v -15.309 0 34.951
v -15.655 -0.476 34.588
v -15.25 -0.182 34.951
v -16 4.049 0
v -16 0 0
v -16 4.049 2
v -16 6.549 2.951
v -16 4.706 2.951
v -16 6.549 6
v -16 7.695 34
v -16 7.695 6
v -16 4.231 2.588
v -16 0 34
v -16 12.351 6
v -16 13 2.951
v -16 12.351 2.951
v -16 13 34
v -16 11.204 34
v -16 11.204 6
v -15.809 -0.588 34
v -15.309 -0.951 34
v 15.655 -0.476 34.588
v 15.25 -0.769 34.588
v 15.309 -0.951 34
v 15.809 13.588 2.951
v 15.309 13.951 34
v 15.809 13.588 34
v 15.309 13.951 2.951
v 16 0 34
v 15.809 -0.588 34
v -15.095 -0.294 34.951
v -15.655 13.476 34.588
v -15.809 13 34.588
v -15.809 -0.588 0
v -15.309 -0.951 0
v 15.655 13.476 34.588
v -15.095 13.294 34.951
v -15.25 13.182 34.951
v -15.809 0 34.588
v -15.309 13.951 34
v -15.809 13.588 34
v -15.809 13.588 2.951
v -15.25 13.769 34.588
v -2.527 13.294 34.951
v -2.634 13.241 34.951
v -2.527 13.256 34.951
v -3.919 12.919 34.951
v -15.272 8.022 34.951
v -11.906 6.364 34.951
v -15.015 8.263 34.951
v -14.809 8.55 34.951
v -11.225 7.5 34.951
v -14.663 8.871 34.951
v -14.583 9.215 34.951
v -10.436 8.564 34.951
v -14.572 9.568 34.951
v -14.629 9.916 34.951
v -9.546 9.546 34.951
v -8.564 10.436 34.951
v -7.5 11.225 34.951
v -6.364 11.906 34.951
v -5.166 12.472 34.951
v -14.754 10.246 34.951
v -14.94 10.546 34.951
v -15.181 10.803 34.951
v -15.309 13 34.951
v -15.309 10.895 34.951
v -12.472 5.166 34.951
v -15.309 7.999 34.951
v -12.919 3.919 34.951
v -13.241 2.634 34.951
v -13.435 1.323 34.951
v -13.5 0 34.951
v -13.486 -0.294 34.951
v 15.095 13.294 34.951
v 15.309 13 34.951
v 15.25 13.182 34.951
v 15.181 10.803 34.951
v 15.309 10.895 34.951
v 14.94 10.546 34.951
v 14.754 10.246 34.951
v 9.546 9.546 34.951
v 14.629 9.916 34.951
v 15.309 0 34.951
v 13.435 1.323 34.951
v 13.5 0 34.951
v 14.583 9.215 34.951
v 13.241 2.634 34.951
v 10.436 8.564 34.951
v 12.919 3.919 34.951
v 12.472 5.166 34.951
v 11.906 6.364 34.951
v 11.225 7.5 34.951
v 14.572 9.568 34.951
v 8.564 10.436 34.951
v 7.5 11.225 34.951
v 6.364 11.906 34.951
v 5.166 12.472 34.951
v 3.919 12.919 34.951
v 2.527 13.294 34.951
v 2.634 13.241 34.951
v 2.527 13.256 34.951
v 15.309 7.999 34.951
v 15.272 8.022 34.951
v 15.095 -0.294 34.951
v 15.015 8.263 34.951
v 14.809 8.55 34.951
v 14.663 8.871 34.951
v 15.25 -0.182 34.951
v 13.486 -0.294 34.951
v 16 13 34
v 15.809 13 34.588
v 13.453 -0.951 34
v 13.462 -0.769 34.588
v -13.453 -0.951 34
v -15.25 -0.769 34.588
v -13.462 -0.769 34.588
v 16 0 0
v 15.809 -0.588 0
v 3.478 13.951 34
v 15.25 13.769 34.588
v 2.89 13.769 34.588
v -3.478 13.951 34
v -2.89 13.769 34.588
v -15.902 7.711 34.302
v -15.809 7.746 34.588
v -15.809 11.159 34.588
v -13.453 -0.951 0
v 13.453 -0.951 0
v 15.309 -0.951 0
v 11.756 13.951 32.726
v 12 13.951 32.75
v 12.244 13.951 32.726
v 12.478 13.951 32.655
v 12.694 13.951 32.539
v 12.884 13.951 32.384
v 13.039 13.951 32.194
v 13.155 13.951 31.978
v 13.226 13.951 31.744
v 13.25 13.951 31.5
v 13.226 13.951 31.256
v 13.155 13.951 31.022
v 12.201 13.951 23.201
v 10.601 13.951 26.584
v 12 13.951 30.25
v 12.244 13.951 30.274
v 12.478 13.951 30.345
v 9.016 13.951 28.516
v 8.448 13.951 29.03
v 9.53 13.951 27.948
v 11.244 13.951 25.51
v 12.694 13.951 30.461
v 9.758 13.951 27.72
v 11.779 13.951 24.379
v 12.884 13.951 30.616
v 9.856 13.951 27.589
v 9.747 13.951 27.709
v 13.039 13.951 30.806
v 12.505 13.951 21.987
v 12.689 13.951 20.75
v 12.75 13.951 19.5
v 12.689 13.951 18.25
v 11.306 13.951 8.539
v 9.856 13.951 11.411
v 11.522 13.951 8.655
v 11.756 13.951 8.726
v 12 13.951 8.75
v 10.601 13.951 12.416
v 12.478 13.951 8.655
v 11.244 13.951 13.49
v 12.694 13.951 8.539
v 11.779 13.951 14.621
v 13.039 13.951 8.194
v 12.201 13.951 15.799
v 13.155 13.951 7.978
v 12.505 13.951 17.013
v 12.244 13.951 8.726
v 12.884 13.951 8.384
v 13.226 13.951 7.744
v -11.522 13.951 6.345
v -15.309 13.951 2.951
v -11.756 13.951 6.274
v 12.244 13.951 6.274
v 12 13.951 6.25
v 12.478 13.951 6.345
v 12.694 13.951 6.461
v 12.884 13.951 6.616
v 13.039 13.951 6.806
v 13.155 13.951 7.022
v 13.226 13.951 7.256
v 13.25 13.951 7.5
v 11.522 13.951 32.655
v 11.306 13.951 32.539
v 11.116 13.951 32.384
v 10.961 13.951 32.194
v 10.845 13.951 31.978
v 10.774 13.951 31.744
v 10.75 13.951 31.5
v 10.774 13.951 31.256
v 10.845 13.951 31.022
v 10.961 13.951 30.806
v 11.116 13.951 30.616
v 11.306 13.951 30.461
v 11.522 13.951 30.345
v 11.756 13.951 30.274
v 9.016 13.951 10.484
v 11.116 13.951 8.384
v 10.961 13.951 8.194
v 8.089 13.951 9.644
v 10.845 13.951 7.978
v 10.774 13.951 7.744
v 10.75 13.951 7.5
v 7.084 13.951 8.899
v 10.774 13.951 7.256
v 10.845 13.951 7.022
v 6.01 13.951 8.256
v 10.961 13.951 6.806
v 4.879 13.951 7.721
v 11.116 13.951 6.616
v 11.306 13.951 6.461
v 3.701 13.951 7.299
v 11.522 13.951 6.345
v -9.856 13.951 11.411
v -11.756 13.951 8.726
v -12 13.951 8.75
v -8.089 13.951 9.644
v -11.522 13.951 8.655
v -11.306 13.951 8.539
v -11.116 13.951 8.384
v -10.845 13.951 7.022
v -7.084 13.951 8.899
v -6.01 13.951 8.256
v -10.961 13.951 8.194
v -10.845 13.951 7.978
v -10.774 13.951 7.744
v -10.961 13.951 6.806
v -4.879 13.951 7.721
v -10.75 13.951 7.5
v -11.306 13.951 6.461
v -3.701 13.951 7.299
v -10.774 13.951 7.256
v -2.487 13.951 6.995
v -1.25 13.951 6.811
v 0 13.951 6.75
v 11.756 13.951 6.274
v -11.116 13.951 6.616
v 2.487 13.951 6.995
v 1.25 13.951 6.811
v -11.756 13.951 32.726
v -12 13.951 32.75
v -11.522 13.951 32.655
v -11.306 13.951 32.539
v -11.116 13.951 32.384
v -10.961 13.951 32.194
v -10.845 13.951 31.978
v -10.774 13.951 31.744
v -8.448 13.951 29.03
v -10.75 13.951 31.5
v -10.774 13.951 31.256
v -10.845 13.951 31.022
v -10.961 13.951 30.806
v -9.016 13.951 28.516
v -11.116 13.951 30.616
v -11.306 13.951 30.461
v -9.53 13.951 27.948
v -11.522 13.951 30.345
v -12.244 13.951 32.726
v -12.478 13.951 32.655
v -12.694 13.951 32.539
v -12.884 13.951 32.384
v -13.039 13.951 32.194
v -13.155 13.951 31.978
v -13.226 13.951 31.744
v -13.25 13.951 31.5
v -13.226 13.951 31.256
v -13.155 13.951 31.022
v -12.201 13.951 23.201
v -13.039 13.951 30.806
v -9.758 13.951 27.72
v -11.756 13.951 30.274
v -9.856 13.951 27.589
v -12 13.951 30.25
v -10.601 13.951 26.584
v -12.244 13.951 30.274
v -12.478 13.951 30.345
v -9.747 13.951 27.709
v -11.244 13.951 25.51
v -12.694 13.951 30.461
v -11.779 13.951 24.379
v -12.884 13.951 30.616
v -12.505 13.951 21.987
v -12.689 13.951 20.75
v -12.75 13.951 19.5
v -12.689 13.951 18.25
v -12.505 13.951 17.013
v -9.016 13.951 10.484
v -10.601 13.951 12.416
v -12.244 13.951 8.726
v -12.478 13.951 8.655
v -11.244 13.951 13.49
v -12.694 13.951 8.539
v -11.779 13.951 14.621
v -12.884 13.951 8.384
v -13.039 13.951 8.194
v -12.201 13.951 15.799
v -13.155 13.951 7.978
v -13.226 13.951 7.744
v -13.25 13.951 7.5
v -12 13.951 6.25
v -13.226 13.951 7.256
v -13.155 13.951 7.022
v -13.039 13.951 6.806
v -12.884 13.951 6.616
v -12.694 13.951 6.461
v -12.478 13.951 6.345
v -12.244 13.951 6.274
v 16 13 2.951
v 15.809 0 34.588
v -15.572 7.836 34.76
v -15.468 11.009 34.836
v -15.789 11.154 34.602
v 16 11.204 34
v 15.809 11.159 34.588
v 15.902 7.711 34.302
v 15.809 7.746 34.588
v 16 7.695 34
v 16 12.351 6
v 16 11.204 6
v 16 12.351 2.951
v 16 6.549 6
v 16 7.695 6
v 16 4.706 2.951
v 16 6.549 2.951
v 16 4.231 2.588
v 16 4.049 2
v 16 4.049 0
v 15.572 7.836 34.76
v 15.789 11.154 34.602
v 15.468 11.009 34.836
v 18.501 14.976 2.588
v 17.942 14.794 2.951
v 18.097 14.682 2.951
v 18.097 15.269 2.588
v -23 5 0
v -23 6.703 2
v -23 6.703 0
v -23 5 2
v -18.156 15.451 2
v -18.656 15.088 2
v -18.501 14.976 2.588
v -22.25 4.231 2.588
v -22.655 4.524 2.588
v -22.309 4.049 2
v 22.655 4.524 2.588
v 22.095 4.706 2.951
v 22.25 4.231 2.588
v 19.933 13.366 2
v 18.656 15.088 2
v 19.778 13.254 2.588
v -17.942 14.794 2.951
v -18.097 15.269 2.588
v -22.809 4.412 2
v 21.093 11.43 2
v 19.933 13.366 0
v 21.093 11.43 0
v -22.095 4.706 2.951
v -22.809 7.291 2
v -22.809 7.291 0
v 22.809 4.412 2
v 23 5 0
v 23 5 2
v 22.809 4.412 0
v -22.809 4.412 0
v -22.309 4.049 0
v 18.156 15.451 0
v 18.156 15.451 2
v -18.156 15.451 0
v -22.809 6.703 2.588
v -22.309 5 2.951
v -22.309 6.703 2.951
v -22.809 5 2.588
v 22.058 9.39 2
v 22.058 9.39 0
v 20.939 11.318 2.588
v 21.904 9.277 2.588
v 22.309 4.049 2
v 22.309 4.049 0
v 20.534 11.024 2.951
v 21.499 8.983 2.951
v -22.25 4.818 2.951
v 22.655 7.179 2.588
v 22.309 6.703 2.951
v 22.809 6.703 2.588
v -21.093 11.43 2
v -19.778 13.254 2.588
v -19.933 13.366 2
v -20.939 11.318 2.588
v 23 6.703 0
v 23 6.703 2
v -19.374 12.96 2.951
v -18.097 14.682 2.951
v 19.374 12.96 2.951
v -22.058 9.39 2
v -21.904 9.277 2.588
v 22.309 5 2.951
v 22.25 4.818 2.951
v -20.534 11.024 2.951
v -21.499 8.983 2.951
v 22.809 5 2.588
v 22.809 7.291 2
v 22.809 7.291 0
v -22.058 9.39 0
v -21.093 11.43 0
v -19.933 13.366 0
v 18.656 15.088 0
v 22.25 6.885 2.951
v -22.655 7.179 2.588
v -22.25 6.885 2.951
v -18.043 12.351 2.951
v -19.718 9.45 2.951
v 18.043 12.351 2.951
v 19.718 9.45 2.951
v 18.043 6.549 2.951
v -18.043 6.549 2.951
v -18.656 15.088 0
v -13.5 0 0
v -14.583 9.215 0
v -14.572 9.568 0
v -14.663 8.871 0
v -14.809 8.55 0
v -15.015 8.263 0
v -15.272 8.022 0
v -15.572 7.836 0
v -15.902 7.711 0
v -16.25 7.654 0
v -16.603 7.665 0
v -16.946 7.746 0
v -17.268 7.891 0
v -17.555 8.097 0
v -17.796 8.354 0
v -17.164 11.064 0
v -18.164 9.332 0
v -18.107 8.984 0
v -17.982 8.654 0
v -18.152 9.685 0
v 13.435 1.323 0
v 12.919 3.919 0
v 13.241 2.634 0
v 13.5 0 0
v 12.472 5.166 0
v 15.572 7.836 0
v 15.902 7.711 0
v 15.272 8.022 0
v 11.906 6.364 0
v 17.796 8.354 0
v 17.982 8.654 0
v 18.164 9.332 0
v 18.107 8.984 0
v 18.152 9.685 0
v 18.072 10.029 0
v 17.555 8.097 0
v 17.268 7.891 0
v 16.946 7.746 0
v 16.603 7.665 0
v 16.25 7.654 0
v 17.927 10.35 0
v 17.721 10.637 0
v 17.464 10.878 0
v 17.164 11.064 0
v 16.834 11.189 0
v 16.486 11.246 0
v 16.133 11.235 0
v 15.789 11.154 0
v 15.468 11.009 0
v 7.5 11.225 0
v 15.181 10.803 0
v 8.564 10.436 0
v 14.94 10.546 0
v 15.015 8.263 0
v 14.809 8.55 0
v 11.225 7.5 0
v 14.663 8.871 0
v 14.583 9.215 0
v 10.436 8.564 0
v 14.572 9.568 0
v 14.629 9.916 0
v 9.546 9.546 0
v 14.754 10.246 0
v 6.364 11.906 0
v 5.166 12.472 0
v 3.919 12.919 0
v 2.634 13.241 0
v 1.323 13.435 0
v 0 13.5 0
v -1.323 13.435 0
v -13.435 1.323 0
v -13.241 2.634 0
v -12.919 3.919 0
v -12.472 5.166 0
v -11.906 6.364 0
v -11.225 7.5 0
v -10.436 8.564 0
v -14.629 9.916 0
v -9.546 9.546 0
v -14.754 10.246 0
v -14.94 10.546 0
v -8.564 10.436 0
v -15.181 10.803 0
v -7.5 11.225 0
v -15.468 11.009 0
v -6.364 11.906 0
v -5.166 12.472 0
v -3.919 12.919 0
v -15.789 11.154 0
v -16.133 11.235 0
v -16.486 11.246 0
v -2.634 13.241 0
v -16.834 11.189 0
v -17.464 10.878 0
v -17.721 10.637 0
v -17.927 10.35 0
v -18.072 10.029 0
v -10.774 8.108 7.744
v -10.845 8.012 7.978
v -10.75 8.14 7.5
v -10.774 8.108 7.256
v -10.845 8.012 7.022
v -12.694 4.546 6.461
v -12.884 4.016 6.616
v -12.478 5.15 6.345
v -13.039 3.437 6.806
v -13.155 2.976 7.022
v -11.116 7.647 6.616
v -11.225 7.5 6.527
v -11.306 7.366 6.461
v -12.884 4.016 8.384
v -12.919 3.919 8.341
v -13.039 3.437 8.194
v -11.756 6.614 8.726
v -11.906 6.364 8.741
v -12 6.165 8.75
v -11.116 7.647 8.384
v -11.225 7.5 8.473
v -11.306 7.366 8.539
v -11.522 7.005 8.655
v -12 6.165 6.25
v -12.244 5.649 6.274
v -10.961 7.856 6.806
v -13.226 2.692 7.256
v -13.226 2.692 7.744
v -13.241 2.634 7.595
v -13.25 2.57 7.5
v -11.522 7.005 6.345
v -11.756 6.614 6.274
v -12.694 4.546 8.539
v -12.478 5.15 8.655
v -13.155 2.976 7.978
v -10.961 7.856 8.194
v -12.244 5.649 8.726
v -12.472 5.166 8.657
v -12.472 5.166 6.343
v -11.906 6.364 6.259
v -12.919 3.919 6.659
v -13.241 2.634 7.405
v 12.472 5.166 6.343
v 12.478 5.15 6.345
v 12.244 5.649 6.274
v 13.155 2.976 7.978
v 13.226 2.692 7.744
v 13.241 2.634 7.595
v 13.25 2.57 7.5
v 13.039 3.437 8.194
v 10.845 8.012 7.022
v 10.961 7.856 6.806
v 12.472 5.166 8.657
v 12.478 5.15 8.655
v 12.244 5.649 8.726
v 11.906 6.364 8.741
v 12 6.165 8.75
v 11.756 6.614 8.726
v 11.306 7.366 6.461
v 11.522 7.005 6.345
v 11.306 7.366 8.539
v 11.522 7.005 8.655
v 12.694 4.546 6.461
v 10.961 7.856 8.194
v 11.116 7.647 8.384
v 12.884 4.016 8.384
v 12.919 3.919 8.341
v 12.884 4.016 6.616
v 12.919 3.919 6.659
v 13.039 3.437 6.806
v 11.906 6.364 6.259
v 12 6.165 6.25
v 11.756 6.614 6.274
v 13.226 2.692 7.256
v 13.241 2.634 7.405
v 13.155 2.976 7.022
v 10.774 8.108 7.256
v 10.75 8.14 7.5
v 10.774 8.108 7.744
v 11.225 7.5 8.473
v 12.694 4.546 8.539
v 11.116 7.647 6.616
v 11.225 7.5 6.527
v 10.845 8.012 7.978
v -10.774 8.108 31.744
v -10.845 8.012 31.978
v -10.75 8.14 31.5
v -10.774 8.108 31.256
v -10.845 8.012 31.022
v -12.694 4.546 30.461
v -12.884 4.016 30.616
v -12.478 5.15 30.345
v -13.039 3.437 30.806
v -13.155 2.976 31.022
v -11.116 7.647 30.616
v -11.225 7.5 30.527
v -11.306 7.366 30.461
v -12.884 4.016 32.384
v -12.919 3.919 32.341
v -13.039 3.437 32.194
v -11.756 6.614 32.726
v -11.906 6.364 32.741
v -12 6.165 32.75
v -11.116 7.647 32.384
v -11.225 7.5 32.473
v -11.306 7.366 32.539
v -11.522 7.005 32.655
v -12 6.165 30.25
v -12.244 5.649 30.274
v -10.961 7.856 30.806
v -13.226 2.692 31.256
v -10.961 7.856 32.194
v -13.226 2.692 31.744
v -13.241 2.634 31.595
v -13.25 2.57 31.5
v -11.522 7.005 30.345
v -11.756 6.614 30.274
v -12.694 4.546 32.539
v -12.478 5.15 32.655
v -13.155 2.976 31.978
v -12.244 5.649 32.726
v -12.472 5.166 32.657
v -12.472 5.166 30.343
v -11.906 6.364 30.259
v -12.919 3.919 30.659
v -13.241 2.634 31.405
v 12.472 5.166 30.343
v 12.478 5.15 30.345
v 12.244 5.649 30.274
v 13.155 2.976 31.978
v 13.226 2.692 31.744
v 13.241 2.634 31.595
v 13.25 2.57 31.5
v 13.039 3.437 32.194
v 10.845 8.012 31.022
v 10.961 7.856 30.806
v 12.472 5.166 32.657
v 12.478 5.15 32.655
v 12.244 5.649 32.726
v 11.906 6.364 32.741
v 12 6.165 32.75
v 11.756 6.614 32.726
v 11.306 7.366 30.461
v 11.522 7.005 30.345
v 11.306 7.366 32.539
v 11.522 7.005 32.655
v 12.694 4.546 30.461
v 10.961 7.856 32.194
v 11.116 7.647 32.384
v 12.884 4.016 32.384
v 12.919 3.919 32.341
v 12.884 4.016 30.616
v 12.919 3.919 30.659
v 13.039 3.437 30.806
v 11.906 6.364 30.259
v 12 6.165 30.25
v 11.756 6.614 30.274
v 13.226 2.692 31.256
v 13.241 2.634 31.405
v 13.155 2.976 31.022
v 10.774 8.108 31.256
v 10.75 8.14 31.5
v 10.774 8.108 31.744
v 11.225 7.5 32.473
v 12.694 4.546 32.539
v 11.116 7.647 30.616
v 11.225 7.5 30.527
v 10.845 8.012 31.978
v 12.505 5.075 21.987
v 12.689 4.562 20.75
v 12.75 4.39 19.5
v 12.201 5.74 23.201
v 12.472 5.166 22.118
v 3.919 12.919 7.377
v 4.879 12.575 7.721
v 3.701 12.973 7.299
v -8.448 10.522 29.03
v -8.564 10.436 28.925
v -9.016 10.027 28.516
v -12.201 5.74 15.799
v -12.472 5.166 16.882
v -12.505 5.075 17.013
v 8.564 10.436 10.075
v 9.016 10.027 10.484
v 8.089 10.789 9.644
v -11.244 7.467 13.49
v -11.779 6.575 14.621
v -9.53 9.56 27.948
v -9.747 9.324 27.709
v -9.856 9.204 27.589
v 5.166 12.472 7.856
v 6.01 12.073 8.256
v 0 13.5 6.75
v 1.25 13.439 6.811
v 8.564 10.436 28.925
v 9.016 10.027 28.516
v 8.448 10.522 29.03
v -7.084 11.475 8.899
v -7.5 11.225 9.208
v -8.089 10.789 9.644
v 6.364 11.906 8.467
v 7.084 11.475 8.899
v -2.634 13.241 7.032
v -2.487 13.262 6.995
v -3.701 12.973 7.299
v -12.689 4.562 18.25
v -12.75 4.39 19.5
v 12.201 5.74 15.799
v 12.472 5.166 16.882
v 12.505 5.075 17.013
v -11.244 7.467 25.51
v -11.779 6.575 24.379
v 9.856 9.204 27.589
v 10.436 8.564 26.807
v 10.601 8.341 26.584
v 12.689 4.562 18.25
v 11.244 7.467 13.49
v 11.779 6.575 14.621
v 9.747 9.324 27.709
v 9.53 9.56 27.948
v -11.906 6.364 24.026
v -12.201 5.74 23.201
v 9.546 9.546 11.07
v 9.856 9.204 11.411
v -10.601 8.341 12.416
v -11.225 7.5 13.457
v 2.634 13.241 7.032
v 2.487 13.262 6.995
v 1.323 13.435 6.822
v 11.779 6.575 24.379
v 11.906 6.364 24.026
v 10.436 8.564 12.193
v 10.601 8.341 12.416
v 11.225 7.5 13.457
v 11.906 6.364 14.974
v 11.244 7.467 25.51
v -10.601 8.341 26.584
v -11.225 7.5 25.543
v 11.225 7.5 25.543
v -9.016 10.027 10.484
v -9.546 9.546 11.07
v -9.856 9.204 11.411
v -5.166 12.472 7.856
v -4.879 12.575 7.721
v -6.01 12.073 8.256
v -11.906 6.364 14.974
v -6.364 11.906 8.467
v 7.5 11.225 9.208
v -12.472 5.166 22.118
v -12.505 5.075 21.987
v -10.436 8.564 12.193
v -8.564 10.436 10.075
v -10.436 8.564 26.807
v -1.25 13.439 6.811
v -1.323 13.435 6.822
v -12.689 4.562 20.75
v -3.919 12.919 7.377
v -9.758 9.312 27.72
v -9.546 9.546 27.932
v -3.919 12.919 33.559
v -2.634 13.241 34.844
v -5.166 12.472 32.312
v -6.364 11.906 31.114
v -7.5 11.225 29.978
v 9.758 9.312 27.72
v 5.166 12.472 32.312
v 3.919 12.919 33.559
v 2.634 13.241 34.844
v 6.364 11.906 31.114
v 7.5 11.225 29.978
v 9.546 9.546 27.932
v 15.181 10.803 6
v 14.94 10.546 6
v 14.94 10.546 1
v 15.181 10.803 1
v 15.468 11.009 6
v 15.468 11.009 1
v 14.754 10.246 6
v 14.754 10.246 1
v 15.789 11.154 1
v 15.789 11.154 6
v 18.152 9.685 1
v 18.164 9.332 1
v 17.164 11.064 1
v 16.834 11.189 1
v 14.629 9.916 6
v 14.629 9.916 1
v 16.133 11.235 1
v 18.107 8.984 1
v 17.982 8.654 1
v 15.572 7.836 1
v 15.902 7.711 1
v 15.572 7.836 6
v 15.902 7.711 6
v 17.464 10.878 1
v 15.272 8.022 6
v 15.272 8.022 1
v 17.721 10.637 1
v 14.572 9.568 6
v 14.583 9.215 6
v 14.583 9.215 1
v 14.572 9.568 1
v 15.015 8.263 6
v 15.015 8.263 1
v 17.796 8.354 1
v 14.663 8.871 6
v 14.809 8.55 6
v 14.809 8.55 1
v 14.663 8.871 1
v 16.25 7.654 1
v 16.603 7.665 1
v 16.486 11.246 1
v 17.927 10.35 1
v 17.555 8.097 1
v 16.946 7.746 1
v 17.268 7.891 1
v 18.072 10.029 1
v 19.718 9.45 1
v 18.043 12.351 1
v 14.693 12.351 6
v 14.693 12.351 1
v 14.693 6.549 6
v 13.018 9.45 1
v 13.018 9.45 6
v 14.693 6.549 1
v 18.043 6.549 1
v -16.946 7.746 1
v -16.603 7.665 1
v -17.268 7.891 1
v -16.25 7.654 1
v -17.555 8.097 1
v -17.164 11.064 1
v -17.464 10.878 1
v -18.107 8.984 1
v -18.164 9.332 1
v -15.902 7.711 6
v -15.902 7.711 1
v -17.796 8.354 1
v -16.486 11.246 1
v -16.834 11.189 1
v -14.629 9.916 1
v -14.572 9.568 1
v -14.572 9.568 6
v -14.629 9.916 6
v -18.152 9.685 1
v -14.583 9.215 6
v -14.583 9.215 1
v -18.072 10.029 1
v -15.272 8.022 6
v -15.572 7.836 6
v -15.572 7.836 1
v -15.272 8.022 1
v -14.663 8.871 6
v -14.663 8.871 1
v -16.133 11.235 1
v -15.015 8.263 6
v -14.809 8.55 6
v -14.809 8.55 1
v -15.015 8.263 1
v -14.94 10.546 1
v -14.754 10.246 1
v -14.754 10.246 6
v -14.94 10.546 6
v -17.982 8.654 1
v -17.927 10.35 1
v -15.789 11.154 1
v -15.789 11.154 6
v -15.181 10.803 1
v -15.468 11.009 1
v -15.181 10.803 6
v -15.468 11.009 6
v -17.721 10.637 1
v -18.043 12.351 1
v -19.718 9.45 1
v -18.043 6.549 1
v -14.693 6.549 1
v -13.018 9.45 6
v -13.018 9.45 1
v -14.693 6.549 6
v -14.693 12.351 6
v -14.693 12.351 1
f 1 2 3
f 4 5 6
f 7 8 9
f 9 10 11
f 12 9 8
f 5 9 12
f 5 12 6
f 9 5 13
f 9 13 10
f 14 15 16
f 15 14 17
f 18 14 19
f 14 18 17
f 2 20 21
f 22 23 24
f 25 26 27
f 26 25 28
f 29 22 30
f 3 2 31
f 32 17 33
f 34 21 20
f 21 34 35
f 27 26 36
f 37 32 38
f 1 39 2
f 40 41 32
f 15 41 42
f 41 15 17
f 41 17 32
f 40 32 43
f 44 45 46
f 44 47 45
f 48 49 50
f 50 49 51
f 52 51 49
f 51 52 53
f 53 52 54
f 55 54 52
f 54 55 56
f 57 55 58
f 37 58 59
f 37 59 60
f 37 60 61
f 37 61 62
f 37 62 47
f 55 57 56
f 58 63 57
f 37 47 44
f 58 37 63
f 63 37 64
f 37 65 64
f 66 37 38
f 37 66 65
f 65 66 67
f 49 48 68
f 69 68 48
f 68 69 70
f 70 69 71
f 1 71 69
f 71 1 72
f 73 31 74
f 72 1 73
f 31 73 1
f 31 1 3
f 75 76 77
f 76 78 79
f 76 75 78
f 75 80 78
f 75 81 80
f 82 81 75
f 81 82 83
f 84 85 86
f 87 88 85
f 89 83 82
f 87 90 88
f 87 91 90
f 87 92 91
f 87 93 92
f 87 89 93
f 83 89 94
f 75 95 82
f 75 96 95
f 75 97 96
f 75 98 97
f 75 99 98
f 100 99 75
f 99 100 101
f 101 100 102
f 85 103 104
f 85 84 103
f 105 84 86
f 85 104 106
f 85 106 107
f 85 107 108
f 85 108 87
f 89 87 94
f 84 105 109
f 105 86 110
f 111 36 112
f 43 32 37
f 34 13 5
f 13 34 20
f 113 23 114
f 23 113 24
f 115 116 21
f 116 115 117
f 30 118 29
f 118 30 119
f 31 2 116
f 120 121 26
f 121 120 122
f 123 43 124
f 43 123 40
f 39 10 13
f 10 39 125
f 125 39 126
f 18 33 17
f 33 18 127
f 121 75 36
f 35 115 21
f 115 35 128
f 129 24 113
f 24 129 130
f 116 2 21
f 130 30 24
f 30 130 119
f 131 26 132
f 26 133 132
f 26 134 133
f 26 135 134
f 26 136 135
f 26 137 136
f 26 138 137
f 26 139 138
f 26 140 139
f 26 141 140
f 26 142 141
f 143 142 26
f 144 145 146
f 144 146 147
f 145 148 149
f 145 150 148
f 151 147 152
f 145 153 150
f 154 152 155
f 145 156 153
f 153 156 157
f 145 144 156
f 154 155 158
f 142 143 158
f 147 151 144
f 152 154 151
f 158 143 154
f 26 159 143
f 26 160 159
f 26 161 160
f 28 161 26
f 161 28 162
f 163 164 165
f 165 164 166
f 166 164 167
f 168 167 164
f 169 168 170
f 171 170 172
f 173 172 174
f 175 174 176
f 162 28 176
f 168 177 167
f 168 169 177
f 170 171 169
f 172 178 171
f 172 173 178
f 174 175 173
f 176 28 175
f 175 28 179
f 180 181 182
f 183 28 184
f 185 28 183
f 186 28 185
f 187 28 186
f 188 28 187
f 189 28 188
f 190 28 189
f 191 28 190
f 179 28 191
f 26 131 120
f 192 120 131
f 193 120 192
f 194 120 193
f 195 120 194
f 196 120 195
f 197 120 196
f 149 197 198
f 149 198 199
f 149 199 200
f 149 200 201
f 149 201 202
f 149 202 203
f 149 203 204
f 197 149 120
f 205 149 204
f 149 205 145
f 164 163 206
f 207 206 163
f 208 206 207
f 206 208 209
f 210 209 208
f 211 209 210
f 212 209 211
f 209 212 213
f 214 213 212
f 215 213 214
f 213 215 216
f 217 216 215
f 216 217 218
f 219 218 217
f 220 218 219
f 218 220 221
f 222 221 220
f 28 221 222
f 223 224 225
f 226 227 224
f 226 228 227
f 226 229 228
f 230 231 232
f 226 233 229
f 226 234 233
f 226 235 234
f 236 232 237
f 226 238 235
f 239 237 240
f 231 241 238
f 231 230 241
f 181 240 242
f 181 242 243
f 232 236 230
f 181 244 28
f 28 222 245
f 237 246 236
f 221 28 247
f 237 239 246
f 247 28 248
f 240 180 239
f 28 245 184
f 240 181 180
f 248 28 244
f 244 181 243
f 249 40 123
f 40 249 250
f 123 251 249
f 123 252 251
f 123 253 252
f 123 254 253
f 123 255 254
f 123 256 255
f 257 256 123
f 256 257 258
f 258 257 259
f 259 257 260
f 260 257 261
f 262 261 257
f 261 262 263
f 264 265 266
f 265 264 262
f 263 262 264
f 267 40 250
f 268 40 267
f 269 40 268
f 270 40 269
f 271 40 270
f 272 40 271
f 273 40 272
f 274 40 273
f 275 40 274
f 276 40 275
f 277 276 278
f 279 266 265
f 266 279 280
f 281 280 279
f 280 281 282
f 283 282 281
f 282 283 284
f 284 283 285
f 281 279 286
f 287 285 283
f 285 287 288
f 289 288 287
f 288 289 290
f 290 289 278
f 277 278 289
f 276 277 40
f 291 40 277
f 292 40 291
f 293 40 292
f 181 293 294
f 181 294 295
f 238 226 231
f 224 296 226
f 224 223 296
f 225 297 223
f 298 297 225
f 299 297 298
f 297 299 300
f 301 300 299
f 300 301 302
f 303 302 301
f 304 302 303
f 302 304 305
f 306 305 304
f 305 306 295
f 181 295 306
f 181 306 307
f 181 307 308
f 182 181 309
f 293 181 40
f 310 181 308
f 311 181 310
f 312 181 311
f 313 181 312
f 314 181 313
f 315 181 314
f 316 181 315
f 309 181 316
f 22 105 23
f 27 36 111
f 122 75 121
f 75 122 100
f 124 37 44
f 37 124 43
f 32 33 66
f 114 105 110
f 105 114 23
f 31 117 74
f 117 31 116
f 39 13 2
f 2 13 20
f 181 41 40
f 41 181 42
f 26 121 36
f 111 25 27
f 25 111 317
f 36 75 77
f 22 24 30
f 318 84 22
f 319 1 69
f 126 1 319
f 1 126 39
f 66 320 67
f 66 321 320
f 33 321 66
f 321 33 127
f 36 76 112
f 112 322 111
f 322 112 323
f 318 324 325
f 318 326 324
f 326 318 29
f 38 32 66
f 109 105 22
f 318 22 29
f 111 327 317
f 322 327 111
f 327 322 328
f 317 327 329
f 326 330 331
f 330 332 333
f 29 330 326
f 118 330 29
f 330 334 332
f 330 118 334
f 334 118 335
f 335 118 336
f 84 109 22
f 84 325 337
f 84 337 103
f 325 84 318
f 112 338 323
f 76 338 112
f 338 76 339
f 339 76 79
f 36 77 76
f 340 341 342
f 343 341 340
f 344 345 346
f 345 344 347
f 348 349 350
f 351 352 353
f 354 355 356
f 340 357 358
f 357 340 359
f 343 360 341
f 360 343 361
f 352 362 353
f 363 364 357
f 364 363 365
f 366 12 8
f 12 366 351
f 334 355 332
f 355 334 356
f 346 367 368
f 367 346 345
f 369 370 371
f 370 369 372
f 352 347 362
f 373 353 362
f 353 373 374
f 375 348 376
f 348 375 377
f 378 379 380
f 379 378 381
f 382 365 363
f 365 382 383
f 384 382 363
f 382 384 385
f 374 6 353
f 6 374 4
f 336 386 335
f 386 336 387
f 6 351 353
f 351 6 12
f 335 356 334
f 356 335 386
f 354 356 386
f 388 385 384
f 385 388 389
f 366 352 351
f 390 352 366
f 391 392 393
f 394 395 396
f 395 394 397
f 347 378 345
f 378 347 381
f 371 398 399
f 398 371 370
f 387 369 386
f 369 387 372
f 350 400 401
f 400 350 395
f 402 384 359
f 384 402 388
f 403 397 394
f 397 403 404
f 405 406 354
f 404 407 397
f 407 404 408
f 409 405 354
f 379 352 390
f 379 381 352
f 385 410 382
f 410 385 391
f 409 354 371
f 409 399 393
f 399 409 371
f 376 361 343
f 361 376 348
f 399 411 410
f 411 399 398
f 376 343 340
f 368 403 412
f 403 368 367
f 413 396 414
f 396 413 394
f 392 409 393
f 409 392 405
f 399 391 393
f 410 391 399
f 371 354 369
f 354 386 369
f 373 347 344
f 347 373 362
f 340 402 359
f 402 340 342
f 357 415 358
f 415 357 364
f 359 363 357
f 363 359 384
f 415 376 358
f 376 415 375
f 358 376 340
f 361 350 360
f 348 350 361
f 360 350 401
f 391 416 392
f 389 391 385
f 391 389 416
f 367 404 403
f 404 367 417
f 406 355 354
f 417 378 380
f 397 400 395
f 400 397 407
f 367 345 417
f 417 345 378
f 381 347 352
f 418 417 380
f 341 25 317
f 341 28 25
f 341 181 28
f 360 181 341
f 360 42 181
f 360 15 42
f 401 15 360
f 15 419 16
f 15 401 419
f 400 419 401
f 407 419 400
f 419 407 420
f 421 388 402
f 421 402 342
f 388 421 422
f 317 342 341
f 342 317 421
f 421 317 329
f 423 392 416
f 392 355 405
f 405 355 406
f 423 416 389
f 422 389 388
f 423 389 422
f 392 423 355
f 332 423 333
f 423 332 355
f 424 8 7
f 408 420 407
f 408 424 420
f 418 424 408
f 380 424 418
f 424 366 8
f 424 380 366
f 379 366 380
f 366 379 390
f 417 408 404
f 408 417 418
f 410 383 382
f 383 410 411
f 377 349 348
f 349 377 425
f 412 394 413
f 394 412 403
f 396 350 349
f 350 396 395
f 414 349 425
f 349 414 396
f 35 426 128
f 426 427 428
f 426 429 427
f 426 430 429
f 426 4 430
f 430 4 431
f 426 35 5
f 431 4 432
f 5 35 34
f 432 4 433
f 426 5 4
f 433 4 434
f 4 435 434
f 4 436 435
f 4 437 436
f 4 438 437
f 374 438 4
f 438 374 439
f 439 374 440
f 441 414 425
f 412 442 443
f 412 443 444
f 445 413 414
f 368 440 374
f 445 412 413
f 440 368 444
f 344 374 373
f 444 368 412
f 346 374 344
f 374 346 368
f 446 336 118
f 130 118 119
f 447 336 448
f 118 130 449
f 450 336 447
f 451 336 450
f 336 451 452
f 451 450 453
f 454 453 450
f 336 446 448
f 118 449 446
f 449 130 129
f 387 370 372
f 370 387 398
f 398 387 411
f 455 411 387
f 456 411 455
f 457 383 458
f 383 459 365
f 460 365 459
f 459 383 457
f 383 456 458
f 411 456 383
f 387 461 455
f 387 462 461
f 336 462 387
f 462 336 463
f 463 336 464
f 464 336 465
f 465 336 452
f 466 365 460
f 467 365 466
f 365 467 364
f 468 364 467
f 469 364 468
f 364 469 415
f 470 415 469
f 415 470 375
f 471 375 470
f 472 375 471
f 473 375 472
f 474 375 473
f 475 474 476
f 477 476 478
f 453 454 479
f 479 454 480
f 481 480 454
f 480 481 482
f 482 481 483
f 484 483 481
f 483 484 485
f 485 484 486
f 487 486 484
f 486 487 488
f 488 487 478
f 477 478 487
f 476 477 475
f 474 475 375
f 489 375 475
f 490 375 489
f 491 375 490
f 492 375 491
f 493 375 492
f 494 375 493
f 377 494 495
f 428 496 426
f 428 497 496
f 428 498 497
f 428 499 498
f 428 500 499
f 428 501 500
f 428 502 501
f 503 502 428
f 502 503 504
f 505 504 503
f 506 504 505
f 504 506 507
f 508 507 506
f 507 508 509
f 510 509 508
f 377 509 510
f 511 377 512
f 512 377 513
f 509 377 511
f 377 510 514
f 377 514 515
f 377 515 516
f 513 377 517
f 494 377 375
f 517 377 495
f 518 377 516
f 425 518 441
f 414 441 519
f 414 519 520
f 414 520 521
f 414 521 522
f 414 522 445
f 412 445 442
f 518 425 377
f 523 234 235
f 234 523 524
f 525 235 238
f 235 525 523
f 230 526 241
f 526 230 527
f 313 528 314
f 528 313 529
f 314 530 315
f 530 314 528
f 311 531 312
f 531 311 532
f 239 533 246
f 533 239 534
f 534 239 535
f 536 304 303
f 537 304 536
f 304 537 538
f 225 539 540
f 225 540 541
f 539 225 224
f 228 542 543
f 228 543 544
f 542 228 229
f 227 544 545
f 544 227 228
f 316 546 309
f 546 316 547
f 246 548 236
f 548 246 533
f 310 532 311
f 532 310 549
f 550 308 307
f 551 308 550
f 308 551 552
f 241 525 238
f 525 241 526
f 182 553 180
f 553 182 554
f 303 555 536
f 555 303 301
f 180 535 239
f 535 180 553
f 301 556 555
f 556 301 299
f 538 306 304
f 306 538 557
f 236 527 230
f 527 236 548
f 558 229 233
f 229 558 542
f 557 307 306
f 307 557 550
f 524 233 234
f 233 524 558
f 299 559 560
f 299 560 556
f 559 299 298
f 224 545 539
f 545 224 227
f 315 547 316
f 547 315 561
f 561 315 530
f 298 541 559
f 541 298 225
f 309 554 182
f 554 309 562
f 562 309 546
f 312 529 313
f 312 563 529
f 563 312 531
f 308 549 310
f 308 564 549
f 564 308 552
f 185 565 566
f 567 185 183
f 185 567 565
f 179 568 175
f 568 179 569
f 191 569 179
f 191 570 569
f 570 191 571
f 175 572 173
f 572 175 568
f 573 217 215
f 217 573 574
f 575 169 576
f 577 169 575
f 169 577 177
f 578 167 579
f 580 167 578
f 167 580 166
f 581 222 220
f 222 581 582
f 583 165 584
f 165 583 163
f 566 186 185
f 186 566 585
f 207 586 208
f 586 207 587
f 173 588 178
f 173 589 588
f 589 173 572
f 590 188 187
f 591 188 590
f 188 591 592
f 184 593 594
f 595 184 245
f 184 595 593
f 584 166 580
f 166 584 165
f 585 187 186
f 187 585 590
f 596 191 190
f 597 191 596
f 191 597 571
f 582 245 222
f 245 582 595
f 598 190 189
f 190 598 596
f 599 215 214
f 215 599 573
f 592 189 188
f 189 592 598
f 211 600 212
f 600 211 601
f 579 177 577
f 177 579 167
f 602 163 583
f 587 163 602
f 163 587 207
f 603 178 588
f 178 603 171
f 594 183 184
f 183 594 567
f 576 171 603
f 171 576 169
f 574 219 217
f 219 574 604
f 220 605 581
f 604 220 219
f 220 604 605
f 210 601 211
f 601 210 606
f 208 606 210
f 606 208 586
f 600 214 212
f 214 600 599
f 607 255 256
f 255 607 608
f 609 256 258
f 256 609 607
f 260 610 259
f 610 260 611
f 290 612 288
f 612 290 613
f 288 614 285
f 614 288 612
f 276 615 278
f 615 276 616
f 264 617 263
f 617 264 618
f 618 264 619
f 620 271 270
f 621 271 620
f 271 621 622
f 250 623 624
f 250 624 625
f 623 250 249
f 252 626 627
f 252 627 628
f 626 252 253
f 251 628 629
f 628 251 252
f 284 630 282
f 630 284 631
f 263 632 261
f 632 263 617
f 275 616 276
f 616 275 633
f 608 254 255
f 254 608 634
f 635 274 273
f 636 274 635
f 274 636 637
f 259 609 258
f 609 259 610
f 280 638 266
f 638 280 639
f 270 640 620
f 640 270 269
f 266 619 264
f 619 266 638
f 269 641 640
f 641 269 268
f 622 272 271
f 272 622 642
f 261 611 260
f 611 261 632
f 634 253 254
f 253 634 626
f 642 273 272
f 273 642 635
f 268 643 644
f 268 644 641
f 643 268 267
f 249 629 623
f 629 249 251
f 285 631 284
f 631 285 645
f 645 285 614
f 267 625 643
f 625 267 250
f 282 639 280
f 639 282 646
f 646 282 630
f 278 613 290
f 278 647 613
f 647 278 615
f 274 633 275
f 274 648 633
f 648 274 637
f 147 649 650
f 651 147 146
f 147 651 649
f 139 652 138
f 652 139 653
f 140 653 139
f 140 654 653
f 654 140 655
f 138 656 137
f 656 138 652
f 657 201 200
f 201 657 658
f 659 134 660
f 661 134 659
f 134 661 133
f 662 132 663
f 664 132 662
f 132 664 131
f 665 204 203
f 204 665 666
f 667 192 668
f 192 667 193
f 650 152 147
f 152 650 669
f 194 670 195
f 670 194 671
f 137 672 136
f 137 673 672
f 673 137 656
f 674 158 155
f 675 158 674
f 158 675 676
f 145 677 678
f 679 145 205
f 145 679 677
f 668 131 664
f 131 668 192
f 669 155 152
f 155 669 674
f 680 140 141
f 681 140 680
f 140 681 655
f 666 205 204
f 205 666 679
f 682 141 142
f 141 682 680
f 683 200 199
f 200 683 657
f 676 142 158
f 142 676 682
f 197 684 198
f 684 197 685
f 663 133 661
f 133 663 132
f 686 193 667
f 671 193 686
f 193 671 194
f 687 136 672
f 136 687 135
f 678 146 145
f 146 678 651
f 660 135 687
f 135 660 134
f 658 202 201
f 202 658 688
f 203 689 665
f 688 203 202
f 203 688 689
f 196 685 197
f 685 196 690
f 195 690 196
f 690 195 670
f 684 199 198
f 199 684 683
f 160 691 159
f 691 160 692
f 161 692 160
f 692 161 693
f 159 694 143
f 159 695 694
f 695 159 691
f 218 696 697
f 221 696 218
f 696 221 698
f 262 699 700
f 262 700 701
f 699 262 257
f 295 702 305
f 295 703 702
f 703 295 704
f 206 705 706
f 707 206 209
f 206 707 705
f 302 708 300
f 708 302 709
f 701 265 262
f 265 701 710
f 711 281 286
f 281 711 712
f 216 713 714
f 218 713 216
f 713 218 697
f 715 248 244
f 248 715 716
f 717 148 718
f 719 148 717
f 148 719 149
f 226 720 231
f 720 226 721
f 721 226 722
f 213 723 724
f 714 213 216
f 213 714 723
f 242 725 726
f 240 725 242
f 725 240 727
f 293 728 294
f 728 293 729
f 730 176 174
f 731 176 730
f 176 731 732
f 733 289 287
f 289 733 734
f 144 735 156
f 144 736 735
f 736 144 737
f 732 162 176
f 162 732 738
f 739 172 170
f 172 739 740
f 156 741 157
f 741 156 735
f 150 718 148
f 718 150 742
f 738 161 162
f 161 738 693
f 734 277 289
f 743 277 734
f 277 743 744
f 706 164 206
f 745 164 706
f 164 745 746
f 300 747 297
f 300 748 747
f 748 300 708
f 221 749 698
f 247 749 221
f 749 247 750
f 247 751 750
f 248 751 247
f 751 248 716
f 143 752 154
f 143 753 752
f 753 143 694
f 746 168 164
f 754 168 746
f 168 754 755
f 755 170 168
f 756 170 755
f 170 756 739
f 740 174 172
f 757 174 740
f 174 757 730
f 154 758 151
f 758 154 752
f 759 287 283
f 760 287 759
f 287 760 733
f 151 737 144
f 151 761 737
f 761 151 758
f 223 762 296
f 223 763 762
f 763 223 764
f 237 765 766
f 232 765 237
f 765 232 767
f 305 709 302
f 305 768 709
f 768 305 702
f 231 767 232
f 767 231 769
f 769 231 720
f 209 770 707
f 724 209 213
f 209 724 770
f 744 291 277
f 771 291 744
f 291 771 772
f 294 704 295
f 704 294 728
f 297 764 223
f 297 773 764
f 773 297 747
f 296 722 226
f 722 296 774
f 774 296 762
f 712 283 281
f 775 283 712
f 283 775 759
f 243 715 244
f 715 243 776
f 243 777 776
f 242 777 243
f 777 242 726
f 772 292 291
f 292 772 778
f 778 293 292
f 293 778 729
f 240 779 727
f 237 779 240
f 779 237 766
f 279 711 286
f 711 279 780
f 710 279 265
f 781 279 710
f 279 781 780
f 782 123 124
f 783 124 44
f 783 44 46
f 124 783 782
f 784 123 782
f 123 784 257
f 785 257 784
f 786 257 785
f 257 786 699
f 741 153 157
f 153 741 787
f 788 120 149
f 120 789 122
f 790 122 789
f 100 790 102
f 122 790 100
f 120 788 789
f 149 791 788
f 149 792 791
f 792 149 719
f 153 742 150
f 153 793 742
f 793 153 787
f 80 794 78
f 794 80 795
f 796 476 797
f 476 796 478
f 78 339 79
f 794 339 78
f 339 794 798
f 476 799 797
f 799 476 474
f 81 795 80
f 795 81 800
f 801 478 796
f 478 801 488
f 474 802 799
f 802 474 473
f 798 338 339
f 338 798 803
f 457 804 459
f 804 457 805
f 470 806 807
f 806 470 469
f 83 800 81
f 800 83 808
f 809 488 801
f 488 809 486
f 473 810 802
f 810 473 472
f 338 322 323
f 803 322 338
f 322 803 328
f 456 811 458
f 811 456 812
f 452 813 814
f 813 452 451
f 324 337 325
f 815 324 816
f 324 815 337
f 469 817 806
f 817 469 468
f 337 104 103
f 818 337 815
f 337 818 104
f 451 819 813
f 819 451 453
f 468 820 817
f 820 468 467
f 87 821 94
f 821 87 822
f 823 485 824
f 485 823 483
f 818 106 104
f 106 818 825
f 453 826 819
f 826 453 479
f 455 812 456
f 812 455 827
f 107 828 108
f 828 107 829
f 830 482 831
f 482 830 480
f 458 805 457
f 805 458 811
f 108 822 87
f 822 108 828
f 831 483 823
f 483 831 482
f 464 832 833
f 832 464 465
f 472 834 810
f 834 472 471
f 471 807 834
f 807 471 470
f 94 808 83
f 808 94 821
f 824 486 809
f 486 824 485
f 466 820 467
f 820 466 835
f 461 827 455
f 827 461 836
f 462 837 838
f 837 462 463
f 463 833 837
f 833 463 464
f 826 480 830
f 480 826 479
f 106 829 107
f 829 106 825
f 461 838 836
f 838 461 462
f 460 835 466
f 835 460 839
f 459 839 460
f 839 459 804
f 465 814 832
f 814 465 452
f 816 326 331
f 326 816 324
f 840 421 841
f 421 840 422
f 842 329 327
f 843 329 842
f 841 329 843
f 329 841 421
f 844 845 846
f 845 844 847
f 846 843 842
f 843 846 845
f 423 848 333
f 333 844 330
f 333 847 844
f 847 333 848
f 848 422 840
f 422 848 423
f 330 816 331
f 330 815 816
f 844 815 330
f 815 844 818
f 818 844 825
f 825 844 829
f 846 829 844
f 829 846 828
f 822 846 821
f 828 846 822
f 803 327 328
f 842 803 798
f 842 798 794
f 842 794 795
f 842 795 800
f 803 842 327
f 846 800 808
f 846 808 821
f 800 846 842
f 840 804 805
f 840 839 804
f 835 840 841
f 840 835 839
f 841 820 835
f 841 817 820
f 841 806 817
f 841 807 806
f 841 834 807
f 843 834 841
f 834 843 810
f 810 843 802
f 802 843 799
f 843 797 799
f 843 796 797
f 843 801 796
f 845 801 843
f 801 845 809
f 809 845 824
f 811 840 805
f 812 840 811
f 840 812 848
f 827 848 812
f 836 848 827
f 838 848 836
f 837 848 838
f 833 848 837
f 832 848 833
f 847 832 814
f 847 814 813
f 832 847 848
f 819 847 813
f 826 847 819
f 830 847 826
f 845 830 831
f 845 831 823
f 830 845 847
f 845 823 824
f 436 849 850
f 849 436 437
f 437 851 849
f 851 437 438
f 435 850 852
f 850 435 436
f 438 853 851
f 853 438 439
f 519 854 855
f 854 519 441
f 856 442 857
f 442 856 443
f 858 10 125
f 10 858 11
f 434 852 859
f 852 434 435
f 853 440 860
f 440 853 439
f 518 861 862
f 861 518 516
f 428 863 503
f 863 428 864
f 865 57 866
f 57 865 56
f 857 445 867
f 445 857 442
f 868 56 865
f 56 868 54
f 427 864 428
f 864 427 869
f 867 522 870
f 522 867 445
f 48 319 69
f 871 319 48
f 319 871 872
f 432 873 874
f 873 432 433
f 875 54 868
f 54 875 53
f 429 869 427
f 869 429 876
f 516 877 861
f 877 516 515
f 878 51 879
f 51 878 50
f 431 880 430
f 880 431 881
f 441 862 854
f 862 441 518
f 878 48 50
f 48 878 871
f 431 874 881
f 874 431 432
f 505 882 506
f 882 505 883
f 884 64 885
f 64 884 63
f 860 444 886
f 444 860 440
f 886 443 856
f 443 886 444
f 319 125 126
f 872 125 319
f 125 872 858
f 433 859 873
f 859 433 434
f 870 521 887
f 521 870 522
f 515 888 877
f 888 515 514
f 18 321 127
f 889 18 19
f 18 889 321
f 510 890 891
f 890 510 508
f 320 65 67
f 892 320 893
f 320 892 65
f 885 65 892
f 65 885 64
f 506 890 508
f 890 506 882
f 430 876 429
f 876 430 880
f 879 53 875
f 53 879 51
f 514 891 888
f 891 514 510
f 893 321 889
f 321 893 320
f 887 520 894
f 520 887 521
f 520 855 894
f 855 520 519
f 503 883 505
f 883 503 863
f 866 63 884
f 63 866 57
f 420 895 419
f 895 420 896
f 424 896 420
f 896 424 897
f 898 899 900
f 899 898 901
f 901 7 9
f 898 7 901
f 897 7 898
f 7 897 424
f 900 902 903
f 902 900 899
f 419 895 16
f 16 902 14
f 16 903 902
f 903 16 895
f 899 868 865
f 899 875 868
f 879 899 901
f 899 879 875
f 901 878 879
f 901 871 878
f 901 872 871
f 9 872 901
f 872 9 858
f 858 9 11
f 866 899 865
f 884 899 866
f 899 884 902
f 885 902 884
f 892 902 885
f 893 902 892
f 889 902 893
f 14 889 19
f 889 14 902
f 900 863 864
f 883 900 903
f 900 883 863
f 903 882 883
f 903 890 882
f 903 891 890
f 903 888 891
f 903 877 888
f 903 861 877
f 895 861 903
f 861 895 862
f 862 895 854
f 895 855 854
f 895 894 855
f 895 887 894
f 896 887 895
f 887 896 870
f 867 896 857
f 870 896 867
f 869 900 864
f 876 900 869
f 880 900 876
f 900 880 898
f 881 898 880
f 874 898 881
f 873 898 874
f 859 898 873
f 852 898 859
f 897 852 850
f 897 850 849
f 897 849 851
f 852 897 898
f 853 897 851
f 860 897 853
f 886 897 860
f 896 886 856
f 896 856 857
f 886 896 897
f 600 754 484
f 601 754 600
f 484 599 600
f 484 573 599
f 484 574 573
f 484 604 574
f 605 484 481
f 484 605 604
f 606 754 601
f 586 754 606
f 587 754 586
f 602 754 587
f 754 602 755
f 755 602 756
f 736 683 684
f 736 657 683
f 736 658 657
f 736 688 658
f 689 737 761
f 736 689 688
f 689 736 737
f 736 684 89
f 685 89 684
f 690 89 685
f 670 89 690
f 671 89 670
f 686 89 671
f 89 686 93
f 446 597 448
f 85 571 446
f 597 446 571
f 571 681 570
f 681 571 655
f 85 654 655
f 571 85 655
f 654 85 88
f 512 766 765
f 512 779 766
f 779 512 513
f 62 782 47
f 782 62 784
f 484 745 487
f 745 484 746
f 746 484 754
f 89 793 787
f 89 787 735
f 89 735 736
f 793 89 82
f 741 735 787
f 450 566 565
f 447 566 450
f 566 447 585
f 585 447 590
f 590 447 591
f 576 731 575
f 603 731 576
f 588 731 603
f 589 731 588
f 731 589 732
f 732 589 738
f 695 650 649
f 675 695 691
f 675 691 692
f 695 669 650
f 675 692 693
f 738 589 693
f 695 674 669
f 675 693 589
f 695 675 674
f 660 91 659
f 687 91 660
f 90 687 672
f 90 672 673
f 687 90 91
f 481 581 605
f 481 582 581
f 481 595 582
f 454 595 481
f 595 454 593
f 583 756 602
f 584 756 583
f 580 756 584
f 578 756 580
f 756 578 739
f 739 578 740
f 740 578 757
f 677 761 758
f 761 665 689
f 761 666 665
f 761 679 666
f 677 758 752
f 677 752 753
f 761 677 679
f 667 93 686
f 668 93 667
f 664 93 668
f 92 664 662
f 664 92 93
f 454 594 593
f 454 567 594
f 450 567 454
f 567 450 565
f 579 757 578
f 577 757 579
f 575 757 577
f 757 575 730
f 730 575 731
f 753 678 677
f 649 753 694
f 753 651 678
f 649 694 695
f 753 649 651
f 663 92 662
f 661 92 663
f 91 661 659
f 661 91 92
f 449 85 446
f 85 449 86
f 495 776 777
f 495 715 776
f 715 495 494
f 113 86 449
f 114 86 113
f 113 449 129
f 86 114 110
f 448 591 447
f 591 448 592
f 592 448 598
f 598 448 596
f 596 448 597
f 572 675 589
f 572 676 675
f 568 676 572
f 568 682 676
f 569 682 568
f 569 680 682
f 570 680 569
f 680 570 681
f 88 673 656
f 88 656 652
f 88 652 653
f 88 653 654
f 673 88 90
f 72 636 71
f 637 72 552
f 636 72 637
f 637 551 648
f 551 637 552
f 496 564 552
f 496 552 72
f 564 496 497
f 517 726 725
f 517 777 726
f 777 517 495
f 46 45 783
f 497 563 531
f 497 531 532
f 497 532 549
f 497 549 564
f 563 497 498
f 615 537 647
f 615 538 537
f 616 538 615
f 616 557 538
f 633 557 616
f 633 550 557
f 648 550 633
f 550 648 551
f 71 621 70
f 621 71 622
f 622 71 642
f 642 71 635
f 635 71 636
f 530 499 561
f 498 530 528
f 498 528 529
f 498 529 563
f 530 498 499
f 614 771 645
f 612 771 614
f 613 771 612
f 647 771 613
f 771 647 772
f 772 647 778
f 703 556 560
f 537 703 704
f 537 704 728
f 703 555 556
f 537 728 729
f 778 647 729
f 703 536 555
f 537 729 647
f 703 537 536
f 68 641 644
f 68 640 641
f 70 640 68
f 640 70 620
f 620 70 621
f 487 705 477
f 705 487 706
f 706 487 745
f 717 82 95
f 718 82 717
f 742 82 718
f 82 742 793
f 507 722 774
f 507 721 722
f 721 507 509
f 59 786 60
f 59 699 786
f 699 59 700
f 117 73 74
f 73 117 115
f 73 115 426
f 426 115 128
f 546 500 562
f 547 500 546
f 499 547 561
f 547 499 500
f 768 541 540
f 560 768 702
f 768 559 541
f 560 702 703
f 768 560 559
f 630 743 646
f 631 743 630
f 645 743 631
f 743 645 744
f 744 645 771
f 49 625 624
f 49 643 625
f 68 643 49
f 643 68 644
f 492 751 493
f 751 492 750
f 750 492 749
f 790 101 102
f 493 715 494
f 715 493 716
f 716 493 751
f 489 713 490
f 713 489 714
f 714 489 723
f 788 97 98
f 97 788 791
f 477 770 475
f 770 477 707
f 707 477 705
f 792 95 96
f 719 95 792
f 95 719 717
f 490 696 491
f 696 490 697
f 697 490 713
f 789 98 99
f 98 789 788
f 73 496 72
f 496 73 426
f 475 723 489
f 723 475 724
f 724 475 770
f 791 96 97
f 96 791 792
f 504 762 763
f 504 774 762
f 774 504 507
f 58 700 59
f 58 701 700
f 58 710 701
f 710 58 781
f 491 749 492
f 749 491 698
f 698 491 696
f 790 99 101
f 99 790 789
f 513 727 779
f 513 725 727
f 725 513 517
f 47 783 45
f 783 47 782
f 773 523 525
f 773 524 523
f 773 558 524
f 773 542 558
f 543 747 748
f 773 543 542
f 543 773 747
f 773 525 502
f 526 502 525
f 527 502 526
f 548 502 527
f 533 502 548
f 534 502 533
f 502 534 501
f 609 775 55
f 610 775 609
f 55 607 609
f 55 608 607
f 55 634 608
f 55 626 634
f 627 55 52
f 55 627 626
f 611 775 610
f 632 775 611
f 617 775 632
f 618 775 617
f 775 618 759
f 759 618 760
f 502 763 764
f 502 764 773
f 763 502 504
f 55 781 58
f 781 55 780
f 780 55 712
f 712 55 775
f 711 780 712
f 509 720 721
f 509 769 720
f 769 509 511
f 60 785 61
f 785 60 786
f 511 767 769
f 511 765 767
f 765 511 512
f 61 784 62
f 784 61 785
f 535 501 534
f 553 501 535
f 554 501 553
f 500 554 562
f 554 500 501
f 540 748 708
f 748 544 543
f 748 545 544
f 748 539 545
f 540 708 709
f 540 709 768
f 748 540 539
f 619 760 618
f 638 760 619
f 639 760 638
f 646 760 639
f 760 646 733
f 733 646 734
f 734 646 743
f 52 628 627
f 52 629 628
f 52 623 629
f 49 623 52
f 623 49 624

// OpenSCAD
M3HoleDiameter = 3.6;
M3NutDiameter = 6.7;

PlateHeight = 3;
FanSize = 30;
FanScrewInset = 3;
FanScrewSize = 2.5;
FanHeightFromPlate = 1;
ShroudExtent = FanSize/2-2;
ShroudEnlargement = 1;
Rounding = 1;

$fn=64;

module cube_center(size,center_x=true,center_y=true) {
	translate([center_x?-size.x/2:0,center_y?-size.y/2:0,0])cube(size);
}

module OuterShape() {
if(0){
	intersection() {
		cylinder(h=PlateHeight,r=23);
		translate([0,5,0])cube_center([44,9.5,48],center_y=false);
	}

	cube_center([FanSize+ShroudEnlargement,ShroudExtent,FanSize+ShroudEnlargement+PlateHeight+FanHeightFromPlate],center_y=false);
}
if(1){
	intersection() {
	minkowski() {
		union() {
			intersection() {
				if(PlateHeight>Rounding) {
					cylinder(h=PlateHeight-Rounding,r=23);
				} else {
					cylinder(h=0.01,r=23);
				}
				translate([0,5,0])cube_center([44,9.5,48],center_y=false);
			}

			cube_center(
				[FanSize+ShroudEnlargement-Rounding,
				ShroudExtent,
				FanSize+ShroudEnlargement-Rounding+PlateHeight+FanHeightFromPlate]
				,center_y=false);
		}
		sphere(Rounding, $fn=10);
	}
	cube_center([60,60,60]);
	}
}
}

module InnerShape() {
	cylinder(h=PlateHeight+FanSize+ShroudEnlargement+10+FanHeightFromPlate,d=27);

	translate([0,ShroudExtent,PlateHeight+FanHeightFromPlate+ShroudEnlargement/2])
	rotate([90,0,0])
		for(pos = [[-FanSize/2+FanScrewInset,FanScrewInset],
				[FanSize/2-FanScrewInset,FanScrewInset],[FanScrewInset-FanSize/2,FanSize-FanScrewInset],[FanSize/2-FanScrewInset,FanSize-FanScrewInset]]) {
			translate([pos.x,pos.y,-0.01-ShroudEnlargement])cylinder(h=FanSize, d=FanScrewSize, $fn=32);

		}

	translate([0,0,PlateHeight+FanSize/2+ShroudEnlargement/2+FanHeightFromPlate])
		rotate([90,0,0]) {
			cylinder(h=60,d=FanSize*0.85,center=true);
			translate([0,FanSize*0.274,0])rotate([0,0,45])cube([FanSize*0.46,FanSize*0.46,60],center=true);
		}

		for(ang = [-60, 0, 60]) rotate([0, 0, 180+ang]) {
			translate([0, -18.9, 0]) {
				cylinder(h=50, d=M3HoleDiameter, $fn=32);
				translate([0,0,1]) cylinder(h=5, d=M3NutDiameter, $fn=6);
			}
		}
}



render() difference() {
	OuterShape();
	InnerShape();
}
